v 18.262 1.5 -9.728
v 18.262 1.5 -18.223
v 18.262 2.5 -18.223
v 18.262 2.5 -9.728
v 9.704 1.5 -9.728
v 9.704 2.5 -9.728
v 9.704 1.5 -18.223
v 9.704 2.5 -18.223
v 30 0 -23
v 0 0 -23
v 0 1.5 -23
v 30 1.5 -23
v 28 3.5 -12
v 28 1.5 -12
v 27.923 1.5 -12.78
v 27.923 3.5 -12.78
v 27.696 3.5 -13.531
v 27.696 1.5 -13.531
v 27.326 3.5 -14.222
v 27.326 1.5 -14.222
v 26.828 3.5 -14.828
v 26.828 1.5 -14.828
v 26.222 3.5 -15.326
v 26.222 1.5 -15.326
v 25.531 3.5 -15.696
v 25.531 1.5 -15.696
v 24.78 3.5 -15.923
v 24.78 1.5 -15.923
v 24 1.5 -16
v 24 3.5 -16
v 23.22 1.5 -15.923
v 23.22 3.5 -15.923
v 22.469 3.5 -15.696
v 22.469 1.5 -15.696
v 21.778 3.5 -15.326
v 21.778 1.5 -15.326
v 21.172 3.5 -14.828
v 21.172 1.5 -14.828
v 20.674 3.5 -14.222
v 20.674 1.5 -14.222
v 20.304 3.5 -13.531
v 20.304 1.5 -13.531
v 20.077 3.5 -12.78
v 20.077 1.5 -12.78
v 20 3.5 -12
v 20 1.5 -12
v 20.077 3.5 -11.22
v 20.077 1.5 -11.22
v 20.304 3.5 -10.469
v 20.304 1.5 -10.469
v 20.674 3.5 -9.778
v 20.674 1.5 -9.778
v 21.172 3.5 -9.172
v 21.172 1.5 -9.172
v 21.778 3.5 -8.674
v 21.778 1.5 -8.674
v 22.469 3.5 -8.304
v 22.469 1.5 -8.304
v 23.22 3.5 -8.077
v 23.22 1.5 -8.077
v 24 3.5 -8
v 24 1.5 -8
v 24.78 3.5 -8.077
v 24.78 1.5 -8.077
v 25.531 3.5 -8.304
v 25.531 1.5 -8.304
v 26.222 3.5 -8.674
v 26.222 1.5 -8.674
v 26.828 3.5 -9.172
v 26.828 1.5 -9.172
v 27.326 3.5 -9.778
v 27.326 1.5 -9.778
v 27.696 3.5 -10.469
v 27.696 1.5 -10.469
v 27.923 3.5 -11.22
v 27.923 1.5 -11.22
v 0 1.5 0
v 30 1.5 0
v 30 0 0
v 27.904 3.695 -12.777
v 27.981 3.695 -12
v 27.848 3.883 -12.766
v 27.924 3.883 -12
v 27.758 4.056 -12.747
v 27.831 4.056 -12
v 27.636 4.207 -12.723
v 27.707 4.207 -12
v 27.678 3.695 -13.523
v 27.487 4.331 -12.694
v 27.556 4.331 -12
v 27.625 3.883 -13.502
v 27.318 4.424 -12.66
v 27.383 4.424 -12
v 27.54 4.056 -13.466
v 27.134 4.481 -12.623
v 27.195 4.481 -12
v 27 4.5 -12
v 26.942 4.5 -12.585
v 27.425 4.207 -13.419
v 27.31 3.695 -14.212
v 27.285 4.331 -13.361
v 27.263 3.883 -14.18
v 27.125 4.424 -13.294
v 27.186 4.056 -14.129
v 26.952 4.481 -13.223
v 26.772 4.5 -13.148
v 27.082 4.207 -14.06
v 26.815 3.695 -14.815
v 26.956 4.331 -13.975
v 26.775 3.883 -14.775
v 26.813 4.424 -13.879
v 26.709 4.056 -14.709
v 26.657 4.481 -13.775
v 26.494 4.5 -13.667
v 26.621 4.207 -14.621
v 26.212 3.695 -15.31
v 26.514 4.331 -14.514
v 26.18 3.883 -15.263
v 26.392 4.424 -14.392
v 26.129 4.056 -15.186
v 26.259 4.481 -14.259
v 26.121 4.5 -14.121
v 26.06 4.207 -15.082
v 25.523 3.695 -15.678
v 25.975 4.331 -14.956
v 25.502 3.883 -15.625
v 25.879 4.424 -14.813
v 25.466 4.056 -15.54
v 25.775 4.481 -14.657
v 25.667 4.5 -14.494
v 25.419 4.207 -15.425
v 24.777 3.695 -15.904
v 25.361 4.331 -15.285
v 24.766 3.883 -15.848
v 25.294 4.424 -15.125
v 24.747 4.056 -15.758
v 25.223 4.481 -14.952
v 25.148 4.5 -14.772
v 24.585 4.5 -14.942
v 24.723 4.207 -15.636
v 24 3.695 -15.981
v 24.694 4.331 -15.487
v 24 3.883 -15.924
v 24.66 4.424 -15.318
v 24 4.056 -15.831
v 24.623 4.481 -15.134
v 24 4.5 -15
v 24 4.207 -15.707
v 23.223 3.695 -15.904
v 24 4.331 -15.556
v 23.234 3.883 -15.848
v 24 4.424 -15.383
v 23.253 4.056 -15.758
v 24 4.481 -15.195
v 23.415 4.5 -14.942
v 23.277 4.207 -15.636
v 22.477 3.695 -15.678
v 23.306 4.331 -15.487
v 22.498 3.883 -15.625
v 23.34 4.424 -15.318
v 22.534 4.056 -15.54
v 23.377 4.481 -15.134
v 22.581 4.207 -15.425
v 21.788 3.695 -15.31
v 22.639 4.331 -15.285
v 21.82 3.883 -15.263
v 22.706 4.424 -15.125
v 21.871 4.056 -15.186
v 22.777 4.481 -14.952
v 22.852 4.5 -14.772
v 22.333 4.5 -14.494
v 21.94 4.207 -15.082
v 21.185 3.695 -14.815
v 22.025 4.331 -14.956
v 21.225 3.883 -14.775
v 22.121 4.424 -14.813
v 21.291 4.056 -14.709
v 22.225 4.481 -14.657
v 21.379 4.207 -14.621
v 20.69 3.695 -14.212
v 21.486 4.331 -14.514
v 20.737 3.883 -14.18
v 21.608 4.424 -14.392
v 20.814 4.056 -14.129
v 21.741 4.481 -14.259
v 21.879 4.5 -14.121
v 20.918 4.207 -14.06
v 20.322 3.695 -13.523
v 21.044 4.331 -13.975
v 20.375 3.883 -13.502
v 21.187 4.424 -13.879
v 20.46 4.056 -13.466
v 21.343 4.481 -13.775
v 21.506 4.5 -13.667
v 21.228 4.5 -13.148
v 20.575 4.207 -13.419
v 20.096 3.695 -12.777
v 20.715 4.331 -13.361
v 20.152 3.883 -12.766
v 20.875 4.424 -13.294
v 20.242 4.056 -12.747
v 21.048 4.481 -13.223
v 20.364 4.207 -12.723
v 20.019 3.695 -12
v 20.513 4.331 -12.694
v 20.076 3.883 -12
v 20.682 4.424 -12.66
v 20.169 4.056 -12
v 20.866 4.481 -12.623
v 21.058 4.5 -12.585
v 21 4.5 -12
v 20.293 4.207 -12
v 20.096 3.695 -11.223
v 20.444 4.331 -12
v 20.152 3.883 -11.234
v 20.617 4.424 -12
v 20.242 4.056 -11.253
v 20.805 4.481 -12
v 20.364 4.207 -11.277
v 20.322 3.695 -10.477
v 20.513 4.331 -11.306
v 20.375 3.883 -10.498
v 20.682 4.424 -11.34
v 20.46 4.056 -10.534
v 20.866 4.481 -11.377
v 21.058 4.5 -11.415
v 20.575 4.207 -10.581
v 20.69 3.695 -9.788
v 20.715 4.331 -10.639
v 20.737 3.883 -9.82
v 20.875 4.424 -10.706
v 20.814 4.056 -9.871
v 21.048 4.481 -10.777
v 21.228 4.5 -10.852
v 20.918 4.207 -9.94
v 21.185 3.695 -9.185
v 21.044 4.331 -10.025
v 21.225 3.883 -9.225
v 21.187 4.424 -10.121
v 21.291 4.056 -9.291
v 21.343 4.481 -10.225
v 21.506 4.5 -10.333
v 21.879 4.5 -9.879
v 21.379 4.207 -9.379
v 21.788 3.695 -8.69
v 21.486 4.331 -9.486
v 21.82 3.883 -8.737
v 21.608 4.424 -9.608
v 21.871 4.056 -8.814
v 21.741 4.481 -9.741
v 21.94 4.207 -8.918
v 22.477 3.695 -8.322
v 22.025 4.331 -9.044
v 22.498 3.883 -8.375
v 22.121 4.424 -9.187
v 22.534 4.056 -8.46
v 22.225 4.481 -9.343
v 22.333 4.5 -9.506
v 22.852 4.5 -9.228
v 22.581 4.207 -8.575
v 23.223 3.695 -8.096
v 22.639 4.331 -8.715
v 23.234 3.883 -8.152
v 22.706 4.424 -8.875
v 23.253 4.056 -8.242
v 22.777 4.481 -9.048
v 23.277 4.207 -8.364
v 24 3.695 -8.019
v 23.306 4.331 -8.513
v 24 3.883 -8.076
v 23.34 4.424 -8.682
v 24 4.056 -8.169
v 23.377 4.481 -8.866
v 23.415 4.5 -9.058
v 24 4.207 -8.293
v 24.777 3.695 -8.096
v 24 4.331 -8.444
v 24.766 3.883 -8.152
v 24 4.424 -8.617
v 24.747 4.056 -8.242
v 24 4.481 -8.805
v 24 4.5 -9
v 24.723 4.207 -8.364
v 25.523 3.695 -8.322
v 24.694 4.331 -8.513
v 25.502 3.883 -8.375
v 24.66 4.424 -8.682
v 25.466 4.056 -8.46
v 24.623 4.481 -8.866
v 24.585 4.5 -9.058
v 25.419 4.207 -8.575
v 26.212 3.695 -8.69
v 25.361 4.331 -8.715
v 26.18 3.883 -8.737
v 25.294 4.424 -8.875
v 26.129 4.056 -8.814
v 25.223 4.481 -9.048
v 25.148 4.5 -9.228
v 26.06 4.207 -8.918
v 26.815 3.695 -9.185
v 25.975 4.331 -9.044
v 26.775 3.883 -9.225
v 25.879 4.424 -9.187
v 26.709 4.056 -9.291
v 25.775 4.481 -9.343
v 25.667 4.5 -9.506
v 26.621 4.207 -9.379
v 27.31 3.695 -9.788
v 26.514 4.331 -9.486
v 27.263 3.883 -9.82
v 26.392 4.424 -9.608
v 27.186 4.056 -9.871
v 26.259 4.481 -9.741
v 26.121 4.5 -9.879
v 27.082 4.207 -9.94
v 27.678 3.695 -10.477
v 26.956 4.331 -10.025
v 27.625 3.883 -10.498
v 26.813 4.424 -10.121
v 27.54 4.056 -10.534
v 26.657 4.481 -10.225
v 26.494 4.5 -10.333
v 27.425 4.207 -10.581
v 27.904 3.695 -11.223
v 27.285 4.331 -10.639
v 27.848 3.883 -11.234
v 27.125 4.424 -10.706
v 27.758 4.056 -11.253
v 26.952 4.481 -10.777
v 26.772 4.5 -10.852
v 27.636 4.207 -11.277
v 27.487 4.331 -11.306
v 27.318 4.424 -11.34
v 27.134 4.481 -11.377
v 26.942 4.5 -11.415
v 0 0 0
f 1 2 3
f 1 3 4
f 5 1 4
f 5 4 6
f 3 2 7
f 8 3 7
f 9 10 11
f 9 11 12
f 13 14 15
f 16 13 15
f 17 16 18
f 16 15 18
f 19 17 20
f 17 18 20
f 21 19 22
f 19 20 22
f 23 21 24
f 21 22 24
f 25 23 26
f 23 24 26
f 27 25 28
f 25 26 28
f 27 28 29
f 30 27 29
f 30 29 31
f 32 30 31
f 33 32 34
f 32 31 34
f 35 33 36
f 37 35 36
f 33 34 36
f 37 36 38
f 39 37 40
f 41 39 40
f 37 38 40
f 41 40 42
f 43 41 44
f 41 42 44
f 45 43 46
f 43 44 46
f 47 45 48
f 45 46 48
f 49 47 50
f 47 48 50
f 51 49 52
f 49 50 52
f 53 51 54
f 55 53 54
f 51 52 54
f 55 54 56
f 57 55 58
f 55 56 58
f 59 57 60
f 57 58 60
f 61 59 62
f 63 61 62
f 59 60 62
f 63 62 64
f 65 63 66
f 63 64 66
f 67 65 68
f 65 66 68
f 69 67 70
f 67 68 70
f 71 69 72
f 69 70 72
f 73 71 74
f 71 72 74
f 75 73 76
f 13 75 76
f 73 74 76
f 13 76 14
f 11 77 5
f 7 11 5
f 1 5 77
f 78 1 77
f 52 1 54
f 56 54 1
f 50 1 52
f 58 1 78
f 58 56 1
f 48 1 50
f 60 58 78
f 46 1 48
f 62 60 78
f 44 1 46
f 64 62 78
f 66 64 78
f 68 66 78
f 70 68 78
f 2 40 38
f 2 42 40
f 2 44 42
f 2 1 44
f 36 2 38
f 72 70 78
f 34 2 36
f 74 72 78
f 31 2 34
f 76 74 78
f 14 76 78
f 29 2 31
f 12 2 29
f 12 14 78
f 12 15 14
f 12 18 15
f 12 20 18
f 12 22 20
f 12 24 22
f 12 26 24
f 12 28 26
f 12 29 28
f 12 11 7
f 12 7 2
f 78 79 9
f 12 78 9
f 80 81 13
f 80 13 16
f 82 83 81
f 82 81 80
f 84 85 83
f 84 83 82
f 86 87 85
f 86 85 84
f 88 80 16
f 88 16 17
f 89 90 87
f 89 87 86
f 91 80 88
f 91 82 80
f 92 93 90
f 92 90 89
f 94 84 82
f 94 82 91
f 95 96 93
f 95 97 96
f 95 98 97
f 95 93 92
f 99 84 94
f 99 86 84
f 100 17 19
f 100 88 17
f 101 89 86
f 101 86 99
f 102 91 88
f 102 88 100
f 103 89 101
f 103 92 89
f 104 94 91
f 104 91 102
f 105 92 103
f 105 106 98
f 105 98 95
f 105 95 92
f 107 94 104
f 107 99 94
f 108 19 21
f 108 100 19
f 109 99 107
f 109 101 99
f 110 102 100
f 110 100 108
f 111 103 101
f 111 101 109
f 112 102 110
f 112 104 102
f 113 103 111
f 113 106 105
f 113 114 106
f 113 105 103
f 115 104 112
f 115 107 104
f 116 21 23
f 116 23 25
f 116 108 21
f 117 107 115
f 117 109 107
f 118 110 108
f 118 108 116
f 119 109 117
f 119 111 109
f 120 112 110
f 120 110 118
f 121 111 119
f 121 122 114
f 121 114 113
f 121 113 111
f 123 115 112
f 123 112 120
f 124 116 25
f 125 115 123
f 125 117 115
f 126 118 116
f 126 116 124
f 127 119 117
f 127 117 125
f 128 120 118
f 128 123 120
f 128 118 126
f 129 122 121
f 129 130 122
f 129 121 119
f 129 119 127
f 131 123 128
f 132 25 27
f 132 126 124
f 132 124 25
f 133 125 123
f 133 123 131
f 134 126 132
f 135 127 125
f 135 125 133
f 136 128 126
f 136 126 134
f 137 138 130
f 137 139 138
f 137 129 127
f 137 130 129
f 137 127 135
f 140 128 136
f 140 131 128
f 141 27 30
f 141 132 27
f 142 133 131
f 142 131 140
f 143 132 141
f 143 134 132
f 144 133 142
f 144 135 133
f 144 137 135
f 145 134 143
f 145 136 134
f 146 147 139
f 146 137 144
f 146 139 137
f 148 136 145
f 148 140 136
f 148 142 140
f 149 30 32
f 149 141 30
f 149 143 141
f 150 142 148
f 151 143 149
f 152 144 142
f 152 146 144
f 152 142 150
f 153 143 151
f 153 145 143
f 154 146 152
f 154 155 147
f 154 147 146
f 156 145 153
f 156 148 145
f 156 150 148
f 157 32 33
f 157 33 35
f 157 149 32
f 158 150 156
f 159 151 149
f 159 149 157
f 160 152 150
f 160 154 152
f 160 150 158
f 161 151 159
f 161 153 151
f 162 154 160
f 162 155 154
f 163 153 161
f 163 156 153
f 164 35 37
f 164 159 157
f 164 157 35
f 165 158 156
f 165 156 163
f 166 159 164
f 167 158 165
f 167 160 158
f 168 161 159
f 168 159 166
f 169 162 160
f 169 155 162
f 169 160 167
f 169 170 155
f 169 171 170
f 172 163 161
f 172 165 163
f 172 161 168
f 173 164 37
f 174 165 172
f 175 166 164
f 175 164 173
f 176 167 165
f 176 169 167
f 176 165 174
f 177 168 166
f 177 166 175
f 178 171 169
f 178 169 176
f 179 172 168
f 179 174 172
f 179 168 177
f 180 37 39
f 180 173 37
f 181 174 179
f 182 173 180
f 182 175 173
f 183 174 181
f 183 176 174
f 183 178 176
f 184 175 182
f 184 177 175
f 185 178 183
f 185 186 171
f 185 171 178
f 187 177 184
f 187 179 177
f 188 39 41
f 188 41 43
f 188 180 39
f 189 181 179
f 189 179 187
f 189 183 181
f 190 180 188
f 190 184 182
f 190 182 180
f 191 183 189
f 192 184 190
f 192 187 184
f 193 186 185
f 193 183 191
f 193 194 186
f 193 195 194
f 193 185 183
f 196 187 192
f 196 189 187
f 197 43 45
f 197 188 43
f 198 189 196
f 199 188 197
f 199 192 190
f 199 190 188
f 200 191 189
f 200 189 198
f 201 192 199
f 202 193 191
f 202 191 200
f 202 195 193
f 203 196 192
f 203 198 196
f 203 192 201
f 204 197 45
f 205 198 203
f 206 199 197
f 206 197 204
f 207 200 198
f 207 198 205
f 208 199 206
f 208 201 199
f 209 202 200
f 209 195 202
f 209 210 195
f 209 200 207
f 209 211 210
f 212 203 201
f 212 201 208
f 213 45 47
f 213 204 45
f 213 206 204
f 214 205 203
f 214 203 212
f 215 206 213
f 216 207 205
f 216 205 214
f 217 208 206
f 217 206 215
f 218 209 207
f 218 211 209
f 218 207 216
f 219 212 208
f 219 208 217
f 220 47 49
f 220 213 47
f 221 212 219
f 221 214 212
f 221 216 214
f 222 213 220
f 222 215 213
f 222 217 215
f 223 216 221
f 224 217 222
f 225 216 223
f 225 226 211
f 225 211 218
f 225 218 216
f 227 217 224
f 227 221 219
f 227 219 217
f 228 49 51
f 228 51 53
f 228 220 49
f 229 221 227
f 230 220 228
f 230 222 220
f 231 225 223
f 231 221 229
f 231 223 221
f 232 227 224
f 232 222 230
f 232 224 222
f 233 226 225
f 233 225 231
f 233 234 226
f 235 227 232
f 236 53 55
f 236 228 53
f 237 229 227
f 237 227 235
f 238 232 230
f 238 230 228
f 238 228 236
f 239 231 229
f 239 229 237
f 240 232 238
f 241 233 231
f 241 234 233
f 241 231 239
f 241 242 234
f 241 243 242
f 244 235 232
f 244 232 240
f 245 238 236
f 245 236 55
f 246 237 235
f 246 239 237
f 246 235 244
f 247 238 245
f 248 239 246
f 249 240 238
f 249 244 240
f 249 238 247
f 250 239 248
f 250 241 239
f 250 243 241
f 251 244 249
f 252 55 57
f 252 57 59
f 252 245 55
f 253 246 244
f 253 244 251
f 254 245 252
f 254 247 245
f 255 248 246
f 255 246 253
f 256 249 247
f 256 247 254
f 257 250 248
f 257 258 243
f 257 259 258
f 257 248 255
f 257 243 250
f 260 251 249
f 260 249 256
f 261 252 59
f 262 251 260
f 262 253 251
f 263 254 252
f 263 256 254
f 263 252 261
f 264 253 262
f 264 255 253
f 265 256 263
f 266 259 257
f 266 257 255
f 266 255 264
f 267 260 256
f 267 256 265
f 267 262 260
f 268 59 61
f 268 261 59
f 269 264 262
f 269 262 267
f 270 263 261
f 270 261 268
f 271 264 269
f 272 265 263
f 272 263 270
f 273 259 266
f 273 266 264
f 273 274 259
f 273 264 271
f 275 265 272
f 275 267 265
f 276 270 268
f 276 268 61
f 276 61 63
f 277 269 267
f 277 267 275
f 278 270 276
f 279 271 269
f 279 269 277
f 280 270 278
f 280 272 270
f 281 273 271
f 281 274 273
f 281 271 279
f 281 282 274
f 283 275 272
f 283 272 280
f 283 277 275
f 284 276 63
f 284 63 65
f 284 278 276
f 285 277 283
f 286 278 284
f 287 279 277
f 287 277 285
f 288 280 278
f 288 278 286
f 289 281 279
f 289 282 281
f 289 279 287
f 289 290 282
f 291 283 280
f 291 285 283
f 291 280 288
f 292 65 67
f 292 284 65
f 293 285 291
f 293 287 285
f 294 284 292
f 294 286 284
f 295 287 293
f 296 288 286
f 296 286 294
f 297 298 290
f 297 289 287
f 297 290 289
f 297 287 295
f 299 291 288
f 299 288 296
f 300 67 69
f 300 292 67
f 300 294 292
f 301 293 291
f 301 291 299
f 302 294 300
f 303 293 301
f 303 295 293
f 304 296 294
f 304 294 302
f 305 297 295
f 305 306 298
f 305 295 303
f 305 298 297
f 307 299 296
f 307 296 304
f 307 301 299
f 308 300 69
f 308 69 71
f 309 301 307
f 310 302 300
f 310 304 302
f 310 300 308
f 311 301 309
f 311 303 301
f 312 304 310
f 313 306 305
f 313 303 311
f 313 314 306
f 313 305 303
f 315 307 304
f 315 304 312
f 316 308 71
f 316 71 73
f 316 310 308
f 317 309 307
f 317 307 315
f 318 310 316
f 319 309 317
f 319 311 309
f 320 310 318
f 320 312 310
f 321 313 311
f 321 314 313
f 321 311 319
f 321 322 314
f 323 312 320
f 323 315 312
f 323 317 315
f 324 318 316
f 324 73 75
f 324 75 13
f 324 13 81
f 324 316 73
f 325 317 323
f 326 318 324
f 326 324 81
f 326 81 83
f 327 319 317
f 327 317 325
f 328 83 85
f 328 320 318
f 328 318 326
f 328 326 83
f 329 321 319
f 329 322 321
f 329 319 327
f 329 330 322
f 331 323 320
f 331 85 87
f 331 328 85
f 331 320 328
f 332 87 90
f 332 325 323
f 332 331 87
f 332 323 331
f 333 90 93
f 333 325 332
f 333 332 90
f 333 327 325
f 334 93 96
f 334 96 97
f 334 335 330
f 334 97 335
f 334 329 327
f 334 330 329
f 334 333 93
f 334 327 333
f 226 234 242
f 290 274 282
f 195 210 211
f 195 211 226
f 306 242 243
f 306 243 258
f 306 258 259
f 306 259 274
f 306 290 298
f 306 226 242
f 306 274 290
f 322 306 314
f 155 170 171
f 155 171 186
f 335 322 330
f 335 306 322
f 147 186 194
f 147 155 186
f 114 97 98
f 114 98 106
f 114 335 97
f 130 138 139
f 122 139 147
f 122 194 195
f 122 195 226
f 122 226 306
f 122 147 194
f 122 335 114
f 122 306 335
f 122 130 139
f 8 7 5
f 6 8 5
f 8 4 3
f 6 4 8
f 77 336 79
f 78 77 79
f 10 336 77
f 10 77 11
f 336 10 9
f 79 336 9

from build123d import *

# Parameters (mm, degrees)
ESBO_O1_W                = 30
ESBO_O1_H                = 23
RESSALTO_EXTRUS_O1_DEPTH = 1.5
ESBO_O2_W                = 8.558282237
ESBO_O2_H                = 8.494651886
RESSALTO_EXTRUS_O2_DEPTH = 1
ESBO_O3_R                = 4
RESSALTO_EXTRUS_O3_DEPTH = 3
FILETE1_R                = 1


with BuildPart() as part:
    # Esboço1 → Ressalto-extrusão1 (new body)
    with BuildSketch(Plane(origin=(0, 0, 0), x_dir=(1, 0, 0), z_dir=(0, 1, 0))):
        with Locations((15, 11.5)):
            Rectangle(ESBO_O1_W, ESBO_O1_H)
    extrude(amount=RESSALTO_EXTRUS_O1_DEPTH)

    # Esboço2 → Ressalto-extrusão2 (add)
    with BuildSketch(Plane(origin=(0, 1.5, 0), x_dir=(-1, 0, 0), z_dir=(0, 1, 0))):
        with Locations((-13.983300564, -13.975214048)):
            Rectangle(ESBO_O2_W, ESBO_O2_H)
    extrude(amount=RESSALTO_EXTRUS_O2_DEPTH)

    # Esboço3 → Ressalto-extrusão3 (add)
    with BuildSketch(Plane(origin=(0, 1.5, 0), x_dir=(1, 0, 0), z_dir=(0, 1, 0))):
        with Locations((24, 12)):
            Circle(ESBO_O3_R)
    extrude(amount=RESSALTO_EXTRUS_O3_DEPTH)

    # Filete1
    filete1_edges = [part.edges().sort_by_distance(p)[0] for p in [
        (20, 4.5, -12),
    ]]
    fillet(filete1_edges, radius=FILETE1_R)


solid = part.part
